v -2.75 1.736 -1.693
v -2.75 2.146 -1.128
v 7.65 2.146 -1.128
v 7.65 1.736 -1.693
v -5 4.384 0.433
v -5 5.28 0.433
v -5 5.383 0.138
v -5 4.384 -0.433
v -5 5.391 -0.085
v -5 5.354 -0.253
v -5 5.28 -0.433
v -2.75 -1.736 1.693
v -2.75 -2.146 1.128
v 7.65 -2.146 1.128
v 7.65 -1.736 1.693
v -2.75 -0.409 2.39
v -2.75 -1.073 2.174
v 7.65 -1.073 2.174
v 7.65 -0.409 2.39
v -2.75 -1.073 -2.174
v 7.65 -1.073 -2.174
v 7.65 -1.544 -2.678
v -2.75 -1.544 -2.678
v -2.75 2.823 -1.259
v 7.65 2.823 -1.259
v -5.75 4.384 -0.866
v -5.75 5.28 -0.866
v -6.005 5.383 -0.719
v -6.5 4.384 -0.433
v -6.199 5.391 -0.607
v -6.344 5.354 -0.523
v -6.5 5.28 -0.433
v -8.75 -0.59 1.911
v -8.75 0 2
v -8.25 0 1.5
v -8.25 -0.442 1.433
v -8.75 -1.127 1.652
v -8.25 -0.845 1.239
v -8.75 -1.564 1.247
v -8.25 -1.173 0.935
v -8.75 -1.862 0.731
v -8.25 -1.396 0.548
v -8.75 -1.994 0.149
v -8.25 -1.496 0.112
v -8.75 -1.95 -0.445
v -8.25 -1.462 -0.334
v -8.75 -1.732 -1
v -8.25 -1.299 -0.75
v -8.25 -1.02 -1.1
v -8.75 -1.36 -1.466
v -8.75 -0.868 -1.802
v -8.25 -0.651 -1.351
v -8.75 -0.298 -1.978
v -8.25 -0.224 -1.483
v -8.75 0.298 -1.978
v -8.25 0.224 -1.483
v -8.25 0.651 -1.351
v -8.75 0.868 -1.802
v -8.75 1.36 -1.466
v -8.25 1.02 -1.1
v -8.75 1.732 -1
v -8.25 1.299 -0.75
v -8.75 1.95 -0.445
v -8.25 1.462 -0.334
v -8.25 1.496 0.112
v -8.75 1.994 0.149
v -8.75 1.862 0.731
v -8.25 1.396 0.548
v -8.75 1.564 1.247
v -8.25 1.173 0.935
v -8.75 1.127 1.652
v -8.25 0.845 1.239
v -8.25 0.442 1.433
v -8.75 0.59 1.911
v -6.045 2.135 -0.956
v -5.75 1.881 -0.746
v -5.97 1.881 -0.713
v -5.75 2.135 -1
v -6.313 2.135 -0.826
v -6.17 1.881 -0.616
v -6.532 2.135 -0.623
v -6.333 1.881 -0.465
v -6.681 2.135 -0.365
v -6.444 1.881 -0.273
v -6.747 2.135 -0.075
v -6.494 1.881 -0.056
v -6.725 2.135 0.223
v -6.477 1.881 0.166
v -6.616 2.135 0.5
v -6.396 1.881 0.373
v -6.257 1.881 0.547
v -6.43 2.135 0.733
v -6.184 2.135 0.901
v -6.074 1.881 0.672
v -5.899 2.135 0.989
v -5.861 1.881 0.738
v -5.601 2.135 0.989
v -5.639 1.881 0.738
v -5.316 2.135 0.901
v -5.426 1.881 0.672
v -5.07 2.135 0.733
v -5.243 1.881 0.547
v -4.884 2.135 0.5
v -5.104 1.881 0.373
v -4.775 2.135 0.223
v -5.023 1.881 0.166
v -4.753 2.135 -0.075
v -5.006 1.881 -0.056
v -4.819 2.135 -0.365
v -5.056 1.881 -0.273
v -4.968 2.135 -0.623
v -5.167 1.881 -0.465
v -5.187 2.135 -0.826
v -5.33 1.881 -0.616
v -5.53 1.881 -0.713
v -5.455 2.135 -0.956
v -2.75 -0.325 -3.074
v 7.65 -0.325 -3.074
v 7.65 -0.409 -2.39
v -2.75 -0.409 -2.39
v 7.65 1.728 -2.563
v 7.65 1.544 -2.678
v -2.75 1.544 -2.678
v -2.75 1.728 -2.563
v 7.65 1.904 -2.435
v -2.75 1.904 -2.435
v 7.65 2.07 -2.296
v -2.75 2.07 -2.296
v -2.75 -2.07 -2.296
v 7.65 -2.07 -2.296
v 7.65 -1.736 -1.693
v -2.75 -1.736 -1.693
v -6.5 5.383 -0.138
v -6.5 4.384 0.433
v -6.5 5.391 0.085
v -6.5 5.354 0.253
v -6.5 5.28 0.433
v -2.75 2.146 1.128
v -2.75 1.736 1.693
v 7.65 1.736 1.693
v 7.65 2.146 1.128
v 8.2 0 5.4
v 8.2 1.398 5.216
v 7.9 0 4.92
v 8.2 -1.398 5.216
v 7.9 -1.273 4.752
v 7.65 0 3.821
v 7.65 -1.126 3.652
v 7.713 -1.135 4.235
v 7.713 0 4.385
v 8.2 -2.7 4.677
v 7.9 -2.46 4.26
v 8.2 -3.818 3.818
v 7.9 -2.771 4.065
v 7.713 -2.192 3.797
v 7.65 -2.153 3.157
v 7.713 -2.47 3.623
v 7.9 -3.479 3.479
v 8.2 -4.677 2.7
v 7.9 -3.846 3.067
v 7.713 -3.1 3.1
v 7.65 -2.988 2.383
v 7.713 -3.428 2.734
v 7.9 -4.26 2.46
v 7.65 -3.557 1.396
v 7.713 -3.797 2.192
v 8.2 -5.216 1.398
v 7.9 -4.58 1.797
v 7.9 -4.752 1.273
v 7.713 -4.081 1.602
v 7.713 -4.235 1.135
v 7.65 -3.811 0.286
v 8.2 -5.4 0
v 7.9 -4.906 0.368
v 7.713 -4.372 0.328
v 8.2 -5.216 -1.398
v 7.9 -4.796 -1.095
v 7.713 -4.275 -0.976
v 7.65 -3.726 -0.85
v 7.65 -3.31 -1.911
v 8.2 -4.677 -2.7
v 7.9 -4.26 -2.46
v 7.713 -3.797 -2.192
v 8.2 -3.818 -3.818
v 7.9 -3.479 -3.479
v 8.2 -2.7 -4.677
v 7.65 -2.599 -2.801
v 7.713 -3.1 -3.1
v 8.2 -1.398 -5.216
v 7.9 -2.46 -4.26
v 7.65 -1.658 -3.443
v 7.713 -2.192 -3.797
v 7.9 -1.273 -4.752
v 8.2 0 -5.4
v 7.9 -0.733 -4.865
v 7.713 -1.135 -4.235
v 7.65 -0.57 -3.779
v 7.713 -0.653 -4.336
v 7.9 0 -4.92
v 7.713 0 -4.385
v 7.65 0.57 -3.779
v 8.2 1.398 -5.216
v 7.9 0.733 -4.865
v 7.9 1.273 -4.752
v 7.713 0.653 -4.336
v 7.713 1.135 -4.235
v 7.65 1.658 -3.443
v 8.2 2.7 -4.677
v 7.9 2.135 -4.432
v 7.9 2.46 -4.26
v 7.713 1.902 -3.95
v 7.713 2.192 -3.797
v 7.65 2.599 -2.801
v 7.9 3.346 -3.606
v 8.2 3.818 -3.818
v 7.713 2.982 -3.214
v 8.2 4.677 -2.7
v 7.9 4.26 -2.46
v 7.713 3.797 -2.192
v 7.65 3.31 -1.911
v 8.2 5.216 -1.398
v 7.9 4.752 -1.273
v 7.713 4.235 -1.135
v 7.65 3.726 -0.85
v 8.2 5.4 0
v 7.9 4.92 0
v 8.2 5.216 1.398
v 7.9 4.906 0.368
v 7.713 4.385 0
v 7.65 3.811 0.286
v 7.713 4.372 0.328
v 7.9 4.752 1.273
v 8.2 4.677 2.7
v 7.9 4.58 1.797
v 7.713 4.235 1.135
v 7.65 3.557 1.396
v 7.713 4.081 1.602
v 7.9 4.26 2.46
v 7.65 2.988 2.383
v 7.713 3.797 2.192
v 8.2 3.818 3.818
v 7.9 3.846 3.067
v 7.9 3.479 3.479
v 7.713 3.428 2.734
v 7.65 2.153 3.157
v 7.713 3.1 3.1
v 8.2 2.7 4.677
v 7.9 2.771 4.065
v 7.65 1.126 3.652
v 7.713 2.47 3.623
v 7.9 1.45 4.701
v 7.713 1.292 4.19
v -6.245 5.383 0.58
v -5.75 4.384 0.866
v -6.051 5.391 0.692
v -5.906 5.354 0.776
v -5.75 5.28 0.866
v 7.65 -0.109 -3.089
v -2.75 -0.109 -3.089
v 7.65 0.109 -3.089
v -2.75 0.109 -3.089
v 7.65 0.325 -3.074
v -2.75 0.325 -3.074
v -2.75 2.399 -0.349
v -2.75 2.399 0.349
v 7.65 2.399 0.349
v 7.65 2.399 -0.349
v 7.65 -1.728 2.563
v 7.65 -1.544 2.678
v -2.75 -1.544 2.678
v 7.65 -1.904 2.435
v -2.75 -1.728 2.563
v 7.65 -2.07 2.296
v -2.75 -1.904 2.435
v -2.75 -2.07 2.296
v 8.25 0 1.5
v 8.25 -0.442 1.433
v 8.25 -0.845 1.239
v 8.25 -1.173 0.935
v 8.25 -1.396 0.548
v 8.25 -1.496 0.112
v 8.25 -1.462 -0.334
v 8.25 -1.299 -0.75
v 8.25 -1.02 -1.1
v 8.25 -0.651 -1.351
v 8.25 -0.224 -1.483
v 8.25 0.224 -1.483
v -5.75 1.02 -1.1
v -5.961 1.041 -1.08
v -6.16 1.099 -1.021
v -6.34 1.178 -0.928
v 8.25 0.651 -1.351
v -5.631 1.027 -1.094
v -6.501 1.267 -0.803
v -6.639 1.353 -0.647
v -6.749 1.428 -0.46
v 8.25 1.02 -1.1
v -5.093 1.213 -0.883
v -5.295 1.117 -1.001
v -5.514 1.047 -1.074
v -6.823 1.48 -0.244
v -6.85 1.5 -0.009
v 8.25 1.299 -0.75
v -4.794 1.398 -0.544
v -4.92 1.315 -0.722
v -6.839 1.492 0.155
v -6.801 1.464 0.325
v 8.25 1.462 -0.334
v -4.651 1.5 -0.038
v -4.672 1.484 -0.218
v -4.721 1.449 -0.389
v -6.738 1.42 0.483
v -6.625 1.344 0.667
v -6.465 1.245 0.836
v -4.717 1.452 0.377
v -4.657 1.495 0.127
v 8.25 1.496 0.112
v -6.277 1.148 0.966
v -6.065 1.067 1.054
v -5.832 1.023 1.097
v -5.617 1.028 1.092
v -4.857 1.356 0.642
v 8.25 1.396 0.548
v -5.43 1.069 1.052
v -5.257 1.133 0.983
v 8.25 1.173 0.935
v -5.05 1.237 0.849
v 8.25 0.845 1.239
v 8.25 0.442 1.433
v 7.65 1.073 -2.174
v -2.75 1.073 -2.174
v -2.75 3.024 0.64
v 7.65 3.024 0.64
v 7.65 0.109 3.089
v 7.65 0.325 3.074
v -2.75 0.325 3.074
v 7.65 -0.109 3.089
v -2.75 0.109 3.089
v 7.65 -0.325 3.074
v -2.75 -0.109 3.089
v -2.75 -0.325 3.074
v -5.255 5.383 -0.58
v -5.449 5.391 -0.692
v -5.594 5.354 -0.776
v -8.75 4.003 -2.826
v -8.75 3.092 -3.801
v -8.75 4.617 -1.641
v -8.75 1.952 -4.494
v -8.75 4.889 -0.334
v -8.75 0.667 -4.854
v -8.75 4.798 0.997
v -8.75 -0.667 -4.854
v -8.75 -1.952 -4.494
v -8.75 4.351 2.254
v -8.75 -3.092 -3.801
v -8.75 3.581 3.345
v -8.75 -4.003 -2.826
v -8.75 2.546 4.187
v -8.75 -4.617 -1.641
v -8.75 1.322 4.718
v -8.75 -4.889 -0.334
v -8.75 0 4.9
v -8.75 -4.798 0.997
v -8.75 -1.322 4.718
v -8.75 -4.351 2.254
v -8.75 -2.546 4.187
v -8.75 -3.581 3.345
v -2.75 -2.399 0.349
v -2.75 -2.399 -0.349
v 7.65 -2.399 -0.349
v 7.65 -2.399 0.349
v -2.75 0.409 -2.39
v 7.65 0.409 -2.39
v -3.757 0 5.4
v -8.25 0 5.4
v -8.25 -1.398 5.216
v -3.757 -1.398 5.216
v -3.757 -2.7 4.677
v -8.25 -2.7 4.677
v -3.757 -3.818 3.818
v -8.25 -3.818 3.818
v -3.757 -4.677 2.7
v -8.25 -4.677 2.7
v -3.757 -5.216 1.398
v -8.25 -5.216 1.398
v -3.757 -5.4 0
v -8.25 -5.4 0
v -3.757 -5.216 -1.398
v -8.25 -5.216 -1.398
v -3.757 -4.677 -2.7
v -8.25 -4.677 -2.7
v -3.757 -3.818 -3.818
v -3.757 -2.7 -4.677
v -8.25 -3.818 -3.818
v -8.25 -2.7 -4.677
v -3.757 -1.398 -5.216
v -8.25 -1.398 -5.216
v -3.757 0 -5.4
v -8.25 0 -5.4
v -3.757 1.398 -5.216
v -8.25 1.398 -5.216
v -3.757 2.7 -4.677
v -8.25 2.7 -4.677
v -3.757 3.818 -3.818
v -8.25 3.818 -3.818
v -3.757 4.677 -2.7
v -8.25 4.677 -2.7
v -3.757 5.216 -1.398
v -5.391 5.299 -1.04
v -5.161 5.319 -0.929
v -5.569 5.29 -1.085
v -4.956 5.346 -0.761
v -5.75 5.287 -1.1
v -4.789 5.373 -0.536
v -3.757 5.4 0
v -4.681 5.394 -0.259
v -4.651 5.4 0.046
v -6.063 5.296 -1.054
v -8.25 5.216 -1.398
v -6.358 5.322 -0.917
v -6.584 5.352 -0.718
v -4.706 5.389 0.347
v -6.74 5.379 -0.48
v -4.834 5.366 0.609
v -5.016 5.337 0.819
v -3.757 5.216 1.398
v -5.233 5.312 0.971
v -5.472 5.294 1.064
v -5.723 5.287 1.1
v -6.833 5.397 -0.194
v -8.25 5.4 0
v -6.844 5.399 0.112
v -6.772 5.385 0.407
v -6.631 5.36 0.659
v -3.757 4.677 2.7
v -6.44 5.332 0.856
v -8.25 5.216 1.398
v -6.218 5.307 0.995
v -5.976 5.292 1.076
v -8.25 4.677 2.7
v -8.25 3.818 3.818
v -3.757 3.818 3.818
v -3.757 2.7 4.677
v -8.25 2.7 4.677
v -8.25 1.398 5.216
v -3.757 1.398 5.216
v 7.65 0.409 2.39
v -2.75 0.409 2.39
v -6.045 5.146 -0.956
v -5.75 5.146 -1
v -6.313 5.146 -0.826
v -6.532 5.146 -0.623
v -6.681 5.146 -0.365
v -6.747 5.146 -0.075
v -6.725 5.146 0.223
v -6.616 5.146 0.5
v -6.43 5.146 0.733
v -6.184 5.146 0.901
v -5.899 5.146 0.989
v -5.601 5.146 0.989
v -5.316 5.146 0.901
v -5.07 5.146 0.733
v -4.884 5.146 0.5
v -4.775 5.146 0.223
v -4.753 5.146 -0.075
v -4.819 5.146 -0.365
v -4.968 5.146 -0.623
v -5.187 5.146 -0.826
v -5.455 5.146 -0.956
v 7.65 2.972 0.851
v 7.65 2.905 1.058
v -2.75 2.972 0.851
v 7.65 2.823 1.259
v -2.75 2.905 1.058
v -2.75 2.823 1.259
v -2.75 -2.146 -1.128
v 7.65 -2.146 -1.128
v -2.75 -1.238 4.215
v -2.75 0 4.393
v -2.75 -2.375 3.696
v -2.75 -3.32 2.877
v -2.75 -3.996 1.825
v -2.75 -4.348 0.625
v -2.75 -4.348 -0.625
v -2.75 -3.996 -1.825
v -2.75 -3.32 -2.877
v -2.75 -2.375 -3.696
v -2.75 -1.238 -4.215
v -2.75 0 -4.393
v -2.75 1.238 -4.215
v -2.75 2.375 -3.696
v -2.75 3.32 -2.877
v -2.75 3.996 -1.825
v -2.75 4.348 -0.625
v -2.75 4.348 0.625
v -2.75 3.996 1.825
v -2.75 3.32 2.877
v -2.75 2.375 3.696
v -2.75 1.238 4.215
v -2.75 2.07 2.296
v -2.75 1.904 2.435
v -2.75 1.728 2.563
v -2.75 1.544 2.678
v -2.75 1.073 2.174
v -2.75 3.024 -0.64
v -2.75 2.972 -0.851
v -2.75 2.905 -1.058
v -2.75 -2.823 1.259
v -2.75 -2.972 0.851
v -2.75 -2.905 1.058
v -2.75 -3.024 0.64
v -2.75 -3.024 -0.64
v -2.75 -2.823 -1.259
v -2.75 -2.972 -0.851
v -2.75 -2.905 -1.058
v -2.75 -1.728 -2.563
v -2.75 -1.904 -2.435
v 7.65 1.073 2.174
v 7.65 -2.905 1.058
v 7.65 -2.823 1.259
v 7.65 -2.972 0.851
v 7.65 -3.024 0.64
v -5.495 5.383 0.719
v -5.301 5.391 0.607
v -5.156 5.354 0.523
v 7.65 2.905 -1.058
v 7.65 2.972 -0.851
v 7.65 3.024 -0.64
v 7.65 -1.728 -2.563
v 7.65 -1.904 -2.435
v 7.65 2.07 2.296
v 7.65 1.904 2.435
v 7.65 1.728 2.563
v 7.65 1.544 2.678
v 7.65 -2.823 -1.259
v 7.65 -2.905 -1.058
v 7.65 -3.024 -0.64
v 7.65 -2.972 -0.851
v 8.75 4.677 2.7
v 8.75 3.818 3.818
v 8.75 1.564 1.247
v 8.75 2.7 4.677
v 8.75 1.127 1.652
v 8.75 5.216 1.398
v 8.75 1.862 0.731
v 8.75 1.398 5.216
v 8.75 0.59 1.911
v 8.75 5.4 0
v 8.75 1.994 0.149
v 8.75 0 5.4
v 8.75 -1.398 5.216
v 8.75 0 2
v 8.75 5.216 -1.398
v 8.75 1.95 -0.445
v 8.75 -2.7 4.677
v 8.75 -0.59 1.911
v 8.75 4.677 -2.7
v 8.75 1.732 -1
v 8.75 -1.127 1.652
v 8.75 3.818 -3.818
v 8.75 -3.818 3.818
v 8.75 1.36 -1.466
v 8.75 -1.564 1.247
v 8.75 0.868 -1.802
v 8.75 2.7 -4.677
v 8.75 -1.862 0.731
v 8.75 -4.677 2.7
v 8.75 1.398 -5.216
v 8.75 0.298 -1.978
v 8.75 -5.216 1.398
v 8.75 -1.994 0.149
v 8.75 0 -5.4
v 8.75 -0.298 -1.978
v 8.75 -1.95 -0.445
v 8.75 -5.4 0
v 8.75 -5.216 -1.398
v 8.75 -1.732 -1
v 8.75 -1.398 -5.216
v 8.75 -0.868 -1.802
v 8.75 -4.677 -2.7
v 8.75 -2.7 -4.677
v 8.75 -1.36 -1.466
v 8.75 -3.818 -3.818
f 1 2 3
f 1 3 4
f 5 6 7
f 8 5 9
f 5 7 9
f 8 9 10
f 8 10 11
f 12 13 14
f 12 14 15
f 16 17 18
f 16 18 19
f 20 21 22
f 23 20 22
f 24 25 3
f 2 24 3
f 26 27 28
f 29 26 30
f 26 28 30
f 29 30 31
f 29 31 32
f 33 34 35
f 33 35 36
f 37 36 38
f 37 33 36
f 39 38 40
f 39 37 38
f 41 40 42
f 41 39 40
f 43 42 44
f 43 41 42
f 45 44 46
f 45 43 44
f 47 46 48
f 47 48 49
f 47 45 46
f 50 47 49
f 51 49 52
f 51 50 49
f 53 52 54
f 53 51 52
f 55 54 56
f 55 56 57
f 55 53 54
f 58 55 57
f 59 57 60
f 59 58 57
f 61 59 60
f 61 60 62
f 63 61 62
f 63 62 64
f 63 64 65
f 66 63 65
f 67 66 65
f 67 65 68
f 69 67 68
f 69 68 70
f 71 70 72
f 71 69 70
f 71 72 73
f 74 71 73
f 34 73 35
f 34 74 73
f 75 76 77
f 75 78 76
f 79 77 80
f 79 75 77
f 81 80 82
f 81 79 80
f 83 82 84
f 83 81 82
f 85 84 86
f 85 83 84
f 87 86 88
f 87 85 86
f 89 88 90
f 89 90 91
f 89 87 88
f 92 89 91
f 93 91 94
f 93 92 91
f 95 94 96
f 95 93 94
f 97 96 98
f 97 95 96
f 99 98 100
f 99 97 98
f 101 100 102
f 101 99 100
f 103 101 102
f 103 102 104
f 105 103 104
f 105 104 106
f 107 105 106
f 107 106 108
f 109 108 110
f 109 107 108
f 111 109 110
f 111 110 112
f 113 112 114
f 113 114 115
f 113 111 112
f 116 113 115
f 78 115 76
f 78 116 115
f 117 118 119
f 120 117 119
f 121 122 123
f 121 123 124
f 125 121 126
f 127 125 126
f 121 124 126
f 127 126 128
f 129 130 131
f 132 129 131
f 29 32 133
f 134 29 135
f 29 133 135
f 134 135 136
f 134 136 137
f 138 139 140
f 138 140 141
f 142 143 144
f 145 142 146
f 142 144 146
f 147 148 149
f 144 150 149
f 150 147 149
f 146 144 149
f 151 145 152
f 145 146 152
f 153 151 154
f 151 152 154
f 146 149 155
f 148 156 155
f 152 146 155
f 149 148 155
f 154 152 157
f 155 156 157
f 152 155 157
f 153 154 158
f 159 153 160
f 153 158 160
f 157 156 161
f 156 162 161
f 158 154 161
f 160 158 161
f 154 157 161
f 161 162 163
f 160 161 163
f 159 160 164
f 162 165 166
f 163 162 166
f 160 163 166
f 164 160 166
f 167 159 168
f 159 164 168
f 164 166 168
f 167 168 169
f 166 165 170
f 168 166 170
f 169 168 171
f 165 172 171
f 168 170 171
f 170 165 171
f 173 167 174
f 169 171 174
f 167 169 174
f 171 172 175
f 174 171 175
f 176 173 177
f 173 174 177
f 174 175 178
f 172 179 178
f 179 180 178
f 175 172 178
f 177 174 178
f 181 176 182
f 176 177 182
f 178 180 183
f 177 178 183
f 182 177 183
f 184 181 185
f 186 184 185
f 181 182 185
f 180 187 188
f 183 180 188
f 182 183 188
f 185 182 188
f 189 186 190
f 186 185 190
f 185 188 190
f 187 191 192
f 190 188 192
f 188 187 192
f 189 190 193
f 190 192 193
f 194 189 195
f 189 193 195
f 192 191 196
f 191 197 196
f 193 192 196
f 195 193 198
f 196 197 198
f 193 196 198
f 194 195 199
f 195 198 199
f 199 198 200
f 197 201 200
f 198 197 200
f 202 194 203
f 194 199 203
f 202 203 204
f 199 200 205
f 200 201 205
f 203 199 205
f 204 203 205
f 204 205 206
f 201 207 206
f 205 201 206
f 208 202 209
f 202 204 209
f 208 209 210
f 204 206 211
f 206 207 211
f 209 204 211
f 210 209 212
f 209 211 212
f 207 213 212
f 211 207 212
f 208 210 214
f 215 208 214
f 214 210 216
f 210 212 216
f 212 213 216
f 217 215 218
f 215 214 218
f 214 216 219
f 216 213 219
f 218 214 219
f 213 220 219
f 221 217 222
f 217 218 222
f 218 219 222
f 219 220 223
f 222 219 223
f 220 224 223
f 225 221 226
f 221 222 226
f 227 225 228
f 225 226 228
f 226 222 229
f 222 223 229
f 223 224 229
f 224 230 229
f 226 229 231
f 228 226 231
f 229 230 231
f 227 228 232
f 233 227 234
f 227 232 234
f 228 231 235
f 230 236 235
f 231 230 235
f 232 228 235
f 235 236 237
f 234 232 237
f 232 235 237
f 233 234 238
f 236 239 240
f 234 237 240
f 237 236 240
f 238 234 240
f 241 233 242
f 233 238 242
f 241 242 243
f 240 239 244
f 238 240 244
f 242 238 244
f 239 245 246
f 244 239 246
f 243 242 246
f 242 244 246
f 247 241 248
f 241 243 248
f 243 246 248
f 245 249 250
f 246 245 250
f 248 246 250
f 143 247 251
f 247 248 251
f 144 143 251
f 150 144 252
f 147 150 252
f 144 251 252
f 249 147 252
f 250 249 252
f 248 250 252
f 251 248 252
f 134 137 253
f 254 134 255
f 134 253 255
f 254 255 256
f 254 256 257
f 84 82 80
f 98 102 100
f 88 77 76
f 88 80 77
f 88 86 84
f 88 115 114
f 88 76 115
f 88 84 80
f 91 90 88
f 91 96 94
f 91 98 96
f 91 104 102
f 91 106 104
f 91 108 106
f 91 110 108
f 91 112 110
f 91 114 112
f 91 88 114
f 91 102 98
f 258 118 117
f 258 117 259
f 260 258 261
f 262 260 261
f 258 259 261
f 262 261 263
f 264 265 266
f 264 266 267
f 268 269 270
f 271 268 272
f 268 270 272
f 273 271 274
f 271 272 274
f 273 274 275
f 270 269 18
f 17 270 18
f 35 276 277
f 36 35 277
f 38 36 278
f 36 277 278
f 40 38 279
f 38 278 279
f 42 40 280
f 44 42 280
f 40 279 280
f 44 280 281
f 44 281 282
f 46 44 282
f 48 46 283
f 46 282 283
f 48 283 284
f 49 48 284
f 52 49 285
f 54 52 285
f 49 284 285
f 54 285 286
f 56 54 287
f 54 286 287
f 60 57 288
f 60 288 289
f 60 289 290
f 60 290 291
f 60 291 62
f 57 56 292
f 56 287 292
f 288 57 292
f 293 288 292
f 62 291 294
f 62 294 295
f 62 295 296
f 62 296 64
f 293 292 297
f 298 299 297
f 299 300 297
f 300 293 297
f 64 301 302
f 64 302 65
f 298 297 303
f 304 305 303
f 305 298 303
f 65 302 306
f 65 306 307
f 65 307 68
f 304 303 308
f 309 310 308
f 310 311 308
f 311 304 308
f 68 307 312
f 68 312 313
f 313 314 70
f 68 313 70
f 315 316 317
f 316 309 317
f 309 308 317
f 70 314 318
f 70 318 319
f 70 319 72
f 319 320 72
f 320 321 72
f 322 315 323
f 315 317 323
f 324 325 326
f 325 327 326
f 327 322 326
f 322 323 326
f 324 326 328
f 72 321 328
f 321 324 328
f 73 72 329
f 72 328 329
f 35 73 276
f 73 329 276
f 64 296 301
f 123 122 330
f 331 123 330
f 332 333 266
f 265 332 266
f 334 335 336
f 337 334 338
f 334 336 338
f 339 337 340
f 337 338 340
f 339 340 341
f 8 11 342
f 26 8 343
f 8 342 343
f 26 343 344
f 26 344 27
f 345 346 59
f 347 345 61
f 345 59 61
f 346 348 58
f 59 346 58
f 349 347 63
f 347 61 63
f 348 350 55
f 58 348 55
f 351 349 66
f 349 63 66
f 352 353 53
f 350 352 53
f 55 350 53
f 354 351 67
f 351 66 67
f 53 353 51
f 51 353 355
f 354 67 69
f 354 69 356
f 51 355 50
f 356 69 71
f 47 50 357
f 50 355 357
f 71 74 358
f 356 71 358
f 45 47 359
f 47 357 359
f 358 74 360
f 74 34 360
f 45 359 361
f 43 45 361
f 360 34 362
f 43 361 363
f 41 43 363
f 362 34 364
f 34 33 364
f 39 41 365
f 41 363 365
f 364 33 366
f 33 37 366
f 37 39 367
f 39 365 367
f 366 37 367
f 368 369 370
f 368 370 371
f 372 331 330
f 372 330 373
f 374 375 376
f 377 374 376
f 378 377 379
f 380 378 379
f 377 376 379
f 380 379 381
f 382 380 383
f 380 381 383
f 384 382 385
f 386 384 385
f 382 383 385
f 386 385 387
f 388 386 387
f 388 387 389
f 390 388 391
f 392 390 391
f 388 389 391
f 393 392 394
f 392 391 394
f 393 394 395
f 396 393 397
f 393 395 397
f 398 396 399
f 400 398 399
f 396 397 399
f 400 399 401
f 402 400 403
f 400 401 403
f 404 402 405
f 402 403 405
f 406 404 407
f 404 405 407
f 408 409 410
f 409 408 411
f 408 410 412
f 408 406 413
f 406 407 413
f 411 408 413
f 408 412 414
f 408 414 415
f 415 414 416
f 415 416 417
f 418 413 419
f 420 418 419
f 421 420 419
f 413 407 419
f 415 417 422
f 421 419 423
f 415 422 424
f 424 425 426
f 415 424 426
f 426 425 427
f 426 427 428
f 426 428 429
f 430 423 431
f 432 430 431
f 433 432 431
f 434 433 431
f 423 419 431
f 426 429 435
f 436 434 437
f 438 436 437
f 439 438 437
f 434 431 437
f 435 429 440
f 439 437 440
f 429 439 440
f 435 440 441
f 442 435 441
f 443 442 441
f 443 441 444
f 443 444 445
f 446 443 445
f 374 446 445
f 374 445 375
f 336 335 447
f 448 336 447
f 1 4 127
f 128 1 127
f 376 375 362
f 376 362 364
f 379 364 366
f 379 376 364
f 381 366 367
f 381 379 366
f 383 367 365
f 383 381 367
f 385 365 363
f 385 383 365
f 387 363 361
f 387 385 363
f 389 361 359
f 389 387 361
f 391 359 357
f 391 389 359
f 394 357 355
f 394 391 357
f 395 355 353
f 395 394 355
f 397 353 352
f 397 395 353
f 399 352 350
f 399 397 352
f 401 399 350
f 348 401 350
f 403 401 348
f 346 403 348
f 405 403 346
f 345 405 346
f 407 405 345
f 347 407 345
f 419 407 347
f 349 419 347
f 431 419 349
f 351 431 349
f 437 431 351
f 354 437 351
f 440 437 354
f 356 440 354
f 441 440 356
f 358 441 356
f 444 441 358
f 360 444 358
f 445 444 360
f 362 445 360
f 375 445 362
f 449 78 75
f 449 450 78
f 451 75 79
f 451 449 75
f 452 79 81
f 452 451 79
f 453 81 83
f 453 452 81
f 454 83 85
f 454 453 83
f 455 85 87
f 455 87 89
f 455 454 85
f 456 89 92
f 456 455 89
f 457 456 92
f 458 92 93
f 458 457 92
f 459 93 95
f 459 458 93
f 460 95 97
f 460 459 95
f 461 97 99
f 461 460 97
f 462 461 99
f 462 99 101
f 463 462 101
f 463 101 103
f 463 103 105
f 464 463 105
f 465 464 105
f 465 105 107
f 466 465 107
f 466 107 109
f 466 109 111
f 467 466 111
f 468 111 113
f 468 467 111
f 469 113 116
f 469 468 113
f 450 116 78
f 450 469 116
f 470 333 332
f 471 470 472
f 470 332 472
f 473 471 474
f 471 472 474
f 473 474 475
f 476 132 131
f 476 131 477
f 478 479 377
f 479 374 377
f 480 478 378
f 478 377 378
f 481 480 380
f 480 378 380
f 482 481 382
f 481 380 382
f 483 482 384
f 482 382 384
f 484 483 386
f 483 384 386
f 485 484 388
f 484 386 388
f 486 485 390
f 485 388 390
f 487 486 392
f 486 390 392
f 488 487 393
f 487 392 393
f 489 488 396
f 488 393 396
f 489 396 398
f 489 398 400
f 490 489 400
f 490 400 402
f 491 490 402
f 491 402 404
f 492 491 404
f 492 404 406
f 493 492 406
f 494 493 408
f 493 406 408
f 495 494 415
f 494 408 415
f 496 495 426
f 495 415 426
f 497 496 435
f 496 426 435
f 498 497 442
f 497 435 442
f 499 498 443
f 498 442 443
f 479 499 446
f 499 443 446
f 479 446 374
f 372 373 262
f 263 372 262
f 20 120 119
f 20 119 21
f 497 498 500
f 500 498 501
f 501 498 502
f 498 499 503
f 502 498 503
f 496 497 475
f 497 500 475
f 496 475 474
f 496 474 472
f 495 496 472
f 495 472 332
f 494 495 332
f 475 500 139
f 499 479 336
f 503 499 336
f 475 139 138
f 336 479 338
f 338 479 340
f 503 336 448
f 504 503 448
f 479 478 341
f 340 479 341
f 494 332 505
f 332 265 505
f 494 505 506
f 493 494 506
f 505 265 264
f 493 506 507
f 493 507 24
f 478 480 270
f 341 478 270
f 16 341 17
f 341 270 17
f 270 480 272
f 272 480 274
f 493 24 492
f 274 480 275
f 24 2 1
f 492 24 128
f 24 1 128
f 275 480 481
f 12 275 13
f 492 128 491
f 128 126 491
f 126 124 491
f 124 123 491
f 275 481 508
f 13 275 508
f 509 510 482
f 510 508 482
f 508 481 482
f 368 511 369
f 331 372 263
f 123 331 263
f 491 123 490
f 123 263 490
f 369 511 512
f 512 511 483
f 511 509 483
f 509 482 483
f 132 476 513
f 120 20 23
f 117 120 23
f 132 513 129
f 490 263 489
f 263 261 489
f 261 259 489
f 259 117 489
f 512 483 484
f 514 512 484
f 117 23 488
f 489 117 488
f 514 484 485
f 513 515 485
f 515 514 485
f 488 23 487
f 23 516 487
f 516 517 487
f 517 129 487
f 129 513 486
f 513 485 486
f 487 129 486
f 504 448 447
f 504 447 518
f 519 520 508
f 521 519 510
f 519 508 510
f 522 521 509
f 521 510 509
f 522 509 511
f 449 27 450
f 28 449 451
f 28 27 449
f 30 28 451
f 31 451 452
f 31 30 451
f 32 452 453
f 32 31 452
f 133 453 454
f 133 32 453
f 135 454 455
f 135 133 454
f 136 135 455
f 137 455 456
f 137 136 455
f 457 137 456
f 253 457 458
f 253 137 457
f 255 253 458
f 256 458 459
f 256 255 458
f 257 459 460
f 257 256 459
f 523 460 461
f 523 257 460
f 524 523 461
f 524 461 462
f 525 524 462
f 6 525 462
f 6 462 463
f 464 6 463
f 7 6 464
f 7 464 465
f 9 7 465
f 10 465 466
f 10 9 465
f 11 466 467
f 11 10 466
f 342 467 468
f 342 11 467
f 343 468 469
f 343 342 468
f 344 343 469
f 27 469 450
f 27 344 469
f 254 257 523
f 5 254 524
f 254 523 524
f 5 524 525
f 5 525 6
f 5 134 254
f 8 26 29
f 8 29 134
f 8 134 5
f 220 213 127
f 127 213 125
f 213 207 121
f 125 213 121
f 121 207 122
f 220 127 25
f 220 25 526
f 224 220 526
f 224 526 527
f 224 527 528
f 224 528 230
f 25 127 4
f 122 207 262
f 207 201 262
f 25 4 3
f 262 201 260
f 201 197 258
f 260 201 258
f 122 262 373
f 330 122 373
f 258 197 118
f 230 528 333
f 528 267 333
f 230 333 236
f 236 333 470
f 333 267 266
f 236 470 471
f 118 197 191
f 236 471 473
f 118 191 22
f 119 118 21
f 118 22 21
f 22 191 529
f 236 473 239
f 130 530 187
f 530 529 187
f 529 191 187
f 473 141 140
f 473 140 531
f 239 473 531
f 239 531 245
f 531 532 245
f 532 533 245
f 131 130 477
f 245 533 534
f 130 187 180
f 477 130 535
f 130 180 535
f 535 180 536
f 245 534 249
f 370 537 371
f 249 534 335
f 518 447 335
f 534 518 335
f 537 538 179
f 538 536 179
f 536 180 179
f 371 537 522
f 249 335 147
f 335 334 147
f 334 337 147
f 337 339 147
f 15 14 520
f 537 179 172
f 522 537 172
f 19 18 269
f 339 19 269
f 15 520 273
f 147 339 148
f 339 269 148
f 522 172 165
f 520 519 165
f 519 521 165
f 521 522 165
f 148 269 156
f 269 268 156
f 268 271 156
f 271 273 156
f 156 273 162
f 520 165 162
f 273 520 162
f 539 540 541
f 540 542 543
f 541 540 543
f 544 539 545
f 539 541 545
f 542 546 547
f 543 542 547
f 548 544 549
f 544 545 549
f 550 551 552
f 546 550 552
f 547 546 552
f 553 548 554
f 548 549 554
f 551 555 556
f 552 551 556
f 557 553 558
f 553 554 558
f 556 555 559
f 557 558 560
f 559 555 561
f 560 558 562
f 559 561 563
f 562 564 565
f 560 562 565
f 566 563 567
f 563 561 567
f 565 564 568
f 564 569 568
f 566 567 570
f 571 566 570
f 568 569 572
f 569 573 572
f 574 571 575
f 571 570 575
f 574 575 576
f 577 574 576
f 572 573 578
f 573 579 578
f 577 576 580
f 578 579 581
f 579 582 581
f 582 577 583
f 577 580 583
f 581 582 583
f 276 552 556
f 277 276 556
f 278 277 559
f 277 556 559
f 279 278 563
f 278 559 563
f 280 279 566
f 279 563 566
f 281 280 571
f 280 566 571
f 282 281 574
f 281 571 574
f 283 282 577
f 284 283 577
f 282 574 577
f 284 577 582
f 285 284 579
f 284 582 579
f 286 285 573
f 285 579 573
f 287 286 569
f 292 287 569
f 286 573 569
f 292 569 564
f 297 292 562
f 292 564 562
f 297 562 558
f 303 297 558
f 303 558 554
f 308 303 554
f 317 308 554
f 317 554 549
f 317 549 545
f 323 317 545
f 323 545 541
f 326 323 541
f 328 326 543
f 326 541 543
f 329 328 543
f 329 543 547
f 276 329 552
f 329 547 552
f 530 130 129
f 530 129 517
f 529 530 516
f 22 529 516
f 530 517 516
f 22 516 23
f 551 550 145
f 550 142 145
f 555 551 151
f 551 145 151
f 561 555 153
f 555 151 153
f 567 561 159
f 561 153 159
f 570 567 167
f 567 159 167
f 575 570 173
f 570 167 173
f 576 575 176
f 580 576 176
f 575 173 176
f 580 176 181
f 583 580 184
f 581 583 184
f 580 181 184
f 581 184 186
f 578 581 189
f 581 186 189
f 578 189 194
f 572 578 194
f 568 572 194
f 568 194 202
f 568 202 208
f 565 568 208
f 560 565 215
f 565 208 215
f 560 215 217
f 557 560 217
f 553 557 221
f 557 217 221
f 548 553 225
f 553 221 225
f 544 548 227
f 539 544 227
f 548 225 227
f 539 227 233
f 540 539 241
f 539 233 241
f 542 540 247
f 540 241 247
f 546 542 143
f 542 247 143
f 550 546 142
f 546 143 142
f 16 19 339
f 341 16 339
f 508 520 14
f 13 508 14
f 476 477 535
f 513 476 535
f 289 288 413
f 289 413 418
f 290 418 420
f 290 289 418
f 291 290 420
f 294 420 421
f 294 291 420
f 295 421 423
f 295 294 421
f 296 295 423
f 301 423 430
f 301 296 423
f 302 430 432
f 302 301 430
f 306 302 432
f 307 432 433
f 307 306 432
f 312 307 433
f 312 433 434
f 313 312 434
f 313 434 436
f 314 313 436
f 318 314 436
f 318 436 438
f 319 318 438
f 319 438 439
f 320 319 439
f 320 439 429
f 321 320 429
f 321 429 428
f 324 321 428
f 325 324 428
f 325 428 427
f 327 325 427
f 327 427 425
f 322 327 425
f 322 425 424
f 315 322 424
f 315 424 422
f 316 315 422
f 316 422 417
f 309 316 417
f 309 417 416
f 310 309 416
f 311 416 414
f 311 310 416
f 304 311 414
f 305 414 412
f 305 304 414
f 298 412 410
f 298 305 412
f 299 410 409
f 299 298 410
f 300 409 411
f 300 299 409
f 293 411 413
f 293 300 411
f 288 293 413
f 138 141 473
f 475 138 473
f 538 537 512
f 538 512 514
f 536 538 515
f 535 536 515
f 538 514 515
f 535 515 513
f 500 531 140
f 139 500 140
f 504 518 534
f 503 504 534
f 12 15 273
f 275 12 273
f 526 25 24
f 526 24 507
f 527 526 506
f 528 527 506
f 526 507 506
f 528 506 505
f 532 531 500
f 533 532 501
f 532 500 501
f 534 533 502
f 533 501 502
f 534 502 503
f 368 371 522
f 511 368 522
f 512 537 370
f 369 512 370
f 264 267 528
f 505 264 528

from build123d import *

# Parameters (mm, degrees)
SKETCH4_R          = 3.25
SKETCH4_R_2        = 3.09125
CUT_EXTRUDE2_DEPTH = 10.4
CUT_EXTRUDE1_DEPTH = 10.4
CIRPATTERN1_COUNT  = 10
SKETCH6_R          = 1.1
CUT_EXTRUDE3_DEPTH = 12.613892543
CUT_EXTRUDE4_DEPTH = 1.016
CHAMFER1_SIZE      = 0.5


with BuildPart() as part:
    # Sketch1 → Revolve1 (revolve)
    with BuildSketch(Plane.XY, mode=Mode.PRIVATE) as revolve1_sk:
        with BuildLine():
            Line((-8.75, 1.5), (8.75, 1.5))
            Line((8.75, 1.5), (8.75, 5.4))
            Line((8.75, 5.4), (8.2, 5.4))
            ThreePointArc((8.2, 5.4), (7.791437689, 4.657287391), (7.65, 3.8215))
            Line((7.65, 3.8215), (7.65, 3.25))
            Line((7.65, 3.25), (-2.75, 3.25))
            Line((-2.75, 3.25), (-2.75, 4.393))
            Line((-2.75, 4.393), (-3.757, 5.4))
            Line((-3.757, 5.4), (-8.75, 5.4))
            Line((-8.75, 5.4), (-8.75, 1.5))
        make_face()
    revolve(revolve1_sk.sketch.rotate(Axis((-8.75, 0, 0), (1, 0, 0)), 90), axis=Axis((-8.75, 0, 0), (1, 0, 0)))

    # Sketch4 → Cut-Extrude2 (cut)
    with BuildSketch(Plane(origin=(-2.75, 0, 0), x_dir=(0, 0, -1), z_dir=(1, 0, 0))):
        Circle(SKETCH4_R)
        with Locations(Location((0, 0, 0), (0, 0, 180))):
            Circle(SKETCH4_R_2, mode=Mode.SUBTRACT)
    extrude(amount=CUT_EXTRUDE2_DEPTH, mode=Mode.SUBTRACT)

    # Sketch3 → Cut-Extrude1 (cut)
    with BuildSketch(Plane(origin=(-2.75, 0, 0), x_dir=(0, 0, -1), z_dir=(1, 0, 0))):
        with BuildLine():
            Line((-0.640467525, 3.024173922), (-0.349056738, 2.399241473))
            Line((-0.349056738, 2.399241473), (0.349056738, 2.399241473))
            Line((0.349056738, 2.399241473), (0.640467525, 3.024173922))
            ThreePointArc((0.640467525, 3.024173922), (0, 3.09125), (-0.640467525, 3.024173922))
        make_face()
    cut_extrude1 = extrude(amount=CUT_EXTRUDE1_DEPTH, mode=Mode.SUBTRACT)

    # CirPattern1: Cut-Extrude1 ×10 about axis
    cirpattern1_axis = Axis((0, 0, 0), (1, 0, 0))
    for i in range(1, CIRPATTERN1_COUNT):
        add(cut_extrude1.rotate(cirpattern1_axis, i * 360 / CIRPATTERN1_COUNT), mode=Mode.SUBTRACT)

    # Sketch6 → Cut-Extrude3 (cut, through all)
    with BuildSketch(Plane(origin=(0, 0, 0), x_dir=(1, 0, 0), z_dir=(0, 1, 0))):
        with Locations(Location((-5.75, 0, 0), (0, 0, 90))):
            Circle(SKETCH6_R)
    extrude(amount=CUT_EXTRUDE3_DEPTH, mode=Mode.SUBTRACT)

    # Chamfer1
    chamfer1_edges = [part.edges().sort_by_distance(p)[0] for p in [
        (-8.75, 0, -5.4),
        (-8.75, 0, -1.5),
        (8.75, 0, -1.5),
    ]]
    chamfer(chamfer1_edges, length=CHAMFER1_SIZE)


with BuildPart() as body_2:
    # Sketch7 → Revolve2 (revolve)
    with BuildSketch(Plane.XY, mode=Mode.PRIVATE) as revolve2_sk:
        Polygon((-6.496, 5.4), (-5.75, 5.4), (-5.75, 1.881), (-6.496, 1.881), (-6.75, 2.135), (-6.75, 5.146), align=None)
    revolve(revolve2_sk.sketch.rotate(Axis((-5.75, 1.881, 0), (0, 1, 0)), 270), axis=Axis((-5.75, 1.881, 0), (0, 1, 0)))

    # Sketch8 → Cut-Extrude4 (cut)
    with BuildSketch(Plane(origin=(0, 5.4, 0), x_dir=(1, 0, 0), z_dir=(0, 1, 0))):
        Polygon((-5.75, 0.866025404), (-6.5, 0.433012702), (-6.5, -0.433012702), (-5.75, -0.866025404), (-5, -0.433012702), (-5, 0.433012702), align=None)
    extrude(amount=-CUT_EXTRUDE4_DEPTH, mode=Mode.SUBTRACT)


solid = Compound([part.part, body_2.part])
